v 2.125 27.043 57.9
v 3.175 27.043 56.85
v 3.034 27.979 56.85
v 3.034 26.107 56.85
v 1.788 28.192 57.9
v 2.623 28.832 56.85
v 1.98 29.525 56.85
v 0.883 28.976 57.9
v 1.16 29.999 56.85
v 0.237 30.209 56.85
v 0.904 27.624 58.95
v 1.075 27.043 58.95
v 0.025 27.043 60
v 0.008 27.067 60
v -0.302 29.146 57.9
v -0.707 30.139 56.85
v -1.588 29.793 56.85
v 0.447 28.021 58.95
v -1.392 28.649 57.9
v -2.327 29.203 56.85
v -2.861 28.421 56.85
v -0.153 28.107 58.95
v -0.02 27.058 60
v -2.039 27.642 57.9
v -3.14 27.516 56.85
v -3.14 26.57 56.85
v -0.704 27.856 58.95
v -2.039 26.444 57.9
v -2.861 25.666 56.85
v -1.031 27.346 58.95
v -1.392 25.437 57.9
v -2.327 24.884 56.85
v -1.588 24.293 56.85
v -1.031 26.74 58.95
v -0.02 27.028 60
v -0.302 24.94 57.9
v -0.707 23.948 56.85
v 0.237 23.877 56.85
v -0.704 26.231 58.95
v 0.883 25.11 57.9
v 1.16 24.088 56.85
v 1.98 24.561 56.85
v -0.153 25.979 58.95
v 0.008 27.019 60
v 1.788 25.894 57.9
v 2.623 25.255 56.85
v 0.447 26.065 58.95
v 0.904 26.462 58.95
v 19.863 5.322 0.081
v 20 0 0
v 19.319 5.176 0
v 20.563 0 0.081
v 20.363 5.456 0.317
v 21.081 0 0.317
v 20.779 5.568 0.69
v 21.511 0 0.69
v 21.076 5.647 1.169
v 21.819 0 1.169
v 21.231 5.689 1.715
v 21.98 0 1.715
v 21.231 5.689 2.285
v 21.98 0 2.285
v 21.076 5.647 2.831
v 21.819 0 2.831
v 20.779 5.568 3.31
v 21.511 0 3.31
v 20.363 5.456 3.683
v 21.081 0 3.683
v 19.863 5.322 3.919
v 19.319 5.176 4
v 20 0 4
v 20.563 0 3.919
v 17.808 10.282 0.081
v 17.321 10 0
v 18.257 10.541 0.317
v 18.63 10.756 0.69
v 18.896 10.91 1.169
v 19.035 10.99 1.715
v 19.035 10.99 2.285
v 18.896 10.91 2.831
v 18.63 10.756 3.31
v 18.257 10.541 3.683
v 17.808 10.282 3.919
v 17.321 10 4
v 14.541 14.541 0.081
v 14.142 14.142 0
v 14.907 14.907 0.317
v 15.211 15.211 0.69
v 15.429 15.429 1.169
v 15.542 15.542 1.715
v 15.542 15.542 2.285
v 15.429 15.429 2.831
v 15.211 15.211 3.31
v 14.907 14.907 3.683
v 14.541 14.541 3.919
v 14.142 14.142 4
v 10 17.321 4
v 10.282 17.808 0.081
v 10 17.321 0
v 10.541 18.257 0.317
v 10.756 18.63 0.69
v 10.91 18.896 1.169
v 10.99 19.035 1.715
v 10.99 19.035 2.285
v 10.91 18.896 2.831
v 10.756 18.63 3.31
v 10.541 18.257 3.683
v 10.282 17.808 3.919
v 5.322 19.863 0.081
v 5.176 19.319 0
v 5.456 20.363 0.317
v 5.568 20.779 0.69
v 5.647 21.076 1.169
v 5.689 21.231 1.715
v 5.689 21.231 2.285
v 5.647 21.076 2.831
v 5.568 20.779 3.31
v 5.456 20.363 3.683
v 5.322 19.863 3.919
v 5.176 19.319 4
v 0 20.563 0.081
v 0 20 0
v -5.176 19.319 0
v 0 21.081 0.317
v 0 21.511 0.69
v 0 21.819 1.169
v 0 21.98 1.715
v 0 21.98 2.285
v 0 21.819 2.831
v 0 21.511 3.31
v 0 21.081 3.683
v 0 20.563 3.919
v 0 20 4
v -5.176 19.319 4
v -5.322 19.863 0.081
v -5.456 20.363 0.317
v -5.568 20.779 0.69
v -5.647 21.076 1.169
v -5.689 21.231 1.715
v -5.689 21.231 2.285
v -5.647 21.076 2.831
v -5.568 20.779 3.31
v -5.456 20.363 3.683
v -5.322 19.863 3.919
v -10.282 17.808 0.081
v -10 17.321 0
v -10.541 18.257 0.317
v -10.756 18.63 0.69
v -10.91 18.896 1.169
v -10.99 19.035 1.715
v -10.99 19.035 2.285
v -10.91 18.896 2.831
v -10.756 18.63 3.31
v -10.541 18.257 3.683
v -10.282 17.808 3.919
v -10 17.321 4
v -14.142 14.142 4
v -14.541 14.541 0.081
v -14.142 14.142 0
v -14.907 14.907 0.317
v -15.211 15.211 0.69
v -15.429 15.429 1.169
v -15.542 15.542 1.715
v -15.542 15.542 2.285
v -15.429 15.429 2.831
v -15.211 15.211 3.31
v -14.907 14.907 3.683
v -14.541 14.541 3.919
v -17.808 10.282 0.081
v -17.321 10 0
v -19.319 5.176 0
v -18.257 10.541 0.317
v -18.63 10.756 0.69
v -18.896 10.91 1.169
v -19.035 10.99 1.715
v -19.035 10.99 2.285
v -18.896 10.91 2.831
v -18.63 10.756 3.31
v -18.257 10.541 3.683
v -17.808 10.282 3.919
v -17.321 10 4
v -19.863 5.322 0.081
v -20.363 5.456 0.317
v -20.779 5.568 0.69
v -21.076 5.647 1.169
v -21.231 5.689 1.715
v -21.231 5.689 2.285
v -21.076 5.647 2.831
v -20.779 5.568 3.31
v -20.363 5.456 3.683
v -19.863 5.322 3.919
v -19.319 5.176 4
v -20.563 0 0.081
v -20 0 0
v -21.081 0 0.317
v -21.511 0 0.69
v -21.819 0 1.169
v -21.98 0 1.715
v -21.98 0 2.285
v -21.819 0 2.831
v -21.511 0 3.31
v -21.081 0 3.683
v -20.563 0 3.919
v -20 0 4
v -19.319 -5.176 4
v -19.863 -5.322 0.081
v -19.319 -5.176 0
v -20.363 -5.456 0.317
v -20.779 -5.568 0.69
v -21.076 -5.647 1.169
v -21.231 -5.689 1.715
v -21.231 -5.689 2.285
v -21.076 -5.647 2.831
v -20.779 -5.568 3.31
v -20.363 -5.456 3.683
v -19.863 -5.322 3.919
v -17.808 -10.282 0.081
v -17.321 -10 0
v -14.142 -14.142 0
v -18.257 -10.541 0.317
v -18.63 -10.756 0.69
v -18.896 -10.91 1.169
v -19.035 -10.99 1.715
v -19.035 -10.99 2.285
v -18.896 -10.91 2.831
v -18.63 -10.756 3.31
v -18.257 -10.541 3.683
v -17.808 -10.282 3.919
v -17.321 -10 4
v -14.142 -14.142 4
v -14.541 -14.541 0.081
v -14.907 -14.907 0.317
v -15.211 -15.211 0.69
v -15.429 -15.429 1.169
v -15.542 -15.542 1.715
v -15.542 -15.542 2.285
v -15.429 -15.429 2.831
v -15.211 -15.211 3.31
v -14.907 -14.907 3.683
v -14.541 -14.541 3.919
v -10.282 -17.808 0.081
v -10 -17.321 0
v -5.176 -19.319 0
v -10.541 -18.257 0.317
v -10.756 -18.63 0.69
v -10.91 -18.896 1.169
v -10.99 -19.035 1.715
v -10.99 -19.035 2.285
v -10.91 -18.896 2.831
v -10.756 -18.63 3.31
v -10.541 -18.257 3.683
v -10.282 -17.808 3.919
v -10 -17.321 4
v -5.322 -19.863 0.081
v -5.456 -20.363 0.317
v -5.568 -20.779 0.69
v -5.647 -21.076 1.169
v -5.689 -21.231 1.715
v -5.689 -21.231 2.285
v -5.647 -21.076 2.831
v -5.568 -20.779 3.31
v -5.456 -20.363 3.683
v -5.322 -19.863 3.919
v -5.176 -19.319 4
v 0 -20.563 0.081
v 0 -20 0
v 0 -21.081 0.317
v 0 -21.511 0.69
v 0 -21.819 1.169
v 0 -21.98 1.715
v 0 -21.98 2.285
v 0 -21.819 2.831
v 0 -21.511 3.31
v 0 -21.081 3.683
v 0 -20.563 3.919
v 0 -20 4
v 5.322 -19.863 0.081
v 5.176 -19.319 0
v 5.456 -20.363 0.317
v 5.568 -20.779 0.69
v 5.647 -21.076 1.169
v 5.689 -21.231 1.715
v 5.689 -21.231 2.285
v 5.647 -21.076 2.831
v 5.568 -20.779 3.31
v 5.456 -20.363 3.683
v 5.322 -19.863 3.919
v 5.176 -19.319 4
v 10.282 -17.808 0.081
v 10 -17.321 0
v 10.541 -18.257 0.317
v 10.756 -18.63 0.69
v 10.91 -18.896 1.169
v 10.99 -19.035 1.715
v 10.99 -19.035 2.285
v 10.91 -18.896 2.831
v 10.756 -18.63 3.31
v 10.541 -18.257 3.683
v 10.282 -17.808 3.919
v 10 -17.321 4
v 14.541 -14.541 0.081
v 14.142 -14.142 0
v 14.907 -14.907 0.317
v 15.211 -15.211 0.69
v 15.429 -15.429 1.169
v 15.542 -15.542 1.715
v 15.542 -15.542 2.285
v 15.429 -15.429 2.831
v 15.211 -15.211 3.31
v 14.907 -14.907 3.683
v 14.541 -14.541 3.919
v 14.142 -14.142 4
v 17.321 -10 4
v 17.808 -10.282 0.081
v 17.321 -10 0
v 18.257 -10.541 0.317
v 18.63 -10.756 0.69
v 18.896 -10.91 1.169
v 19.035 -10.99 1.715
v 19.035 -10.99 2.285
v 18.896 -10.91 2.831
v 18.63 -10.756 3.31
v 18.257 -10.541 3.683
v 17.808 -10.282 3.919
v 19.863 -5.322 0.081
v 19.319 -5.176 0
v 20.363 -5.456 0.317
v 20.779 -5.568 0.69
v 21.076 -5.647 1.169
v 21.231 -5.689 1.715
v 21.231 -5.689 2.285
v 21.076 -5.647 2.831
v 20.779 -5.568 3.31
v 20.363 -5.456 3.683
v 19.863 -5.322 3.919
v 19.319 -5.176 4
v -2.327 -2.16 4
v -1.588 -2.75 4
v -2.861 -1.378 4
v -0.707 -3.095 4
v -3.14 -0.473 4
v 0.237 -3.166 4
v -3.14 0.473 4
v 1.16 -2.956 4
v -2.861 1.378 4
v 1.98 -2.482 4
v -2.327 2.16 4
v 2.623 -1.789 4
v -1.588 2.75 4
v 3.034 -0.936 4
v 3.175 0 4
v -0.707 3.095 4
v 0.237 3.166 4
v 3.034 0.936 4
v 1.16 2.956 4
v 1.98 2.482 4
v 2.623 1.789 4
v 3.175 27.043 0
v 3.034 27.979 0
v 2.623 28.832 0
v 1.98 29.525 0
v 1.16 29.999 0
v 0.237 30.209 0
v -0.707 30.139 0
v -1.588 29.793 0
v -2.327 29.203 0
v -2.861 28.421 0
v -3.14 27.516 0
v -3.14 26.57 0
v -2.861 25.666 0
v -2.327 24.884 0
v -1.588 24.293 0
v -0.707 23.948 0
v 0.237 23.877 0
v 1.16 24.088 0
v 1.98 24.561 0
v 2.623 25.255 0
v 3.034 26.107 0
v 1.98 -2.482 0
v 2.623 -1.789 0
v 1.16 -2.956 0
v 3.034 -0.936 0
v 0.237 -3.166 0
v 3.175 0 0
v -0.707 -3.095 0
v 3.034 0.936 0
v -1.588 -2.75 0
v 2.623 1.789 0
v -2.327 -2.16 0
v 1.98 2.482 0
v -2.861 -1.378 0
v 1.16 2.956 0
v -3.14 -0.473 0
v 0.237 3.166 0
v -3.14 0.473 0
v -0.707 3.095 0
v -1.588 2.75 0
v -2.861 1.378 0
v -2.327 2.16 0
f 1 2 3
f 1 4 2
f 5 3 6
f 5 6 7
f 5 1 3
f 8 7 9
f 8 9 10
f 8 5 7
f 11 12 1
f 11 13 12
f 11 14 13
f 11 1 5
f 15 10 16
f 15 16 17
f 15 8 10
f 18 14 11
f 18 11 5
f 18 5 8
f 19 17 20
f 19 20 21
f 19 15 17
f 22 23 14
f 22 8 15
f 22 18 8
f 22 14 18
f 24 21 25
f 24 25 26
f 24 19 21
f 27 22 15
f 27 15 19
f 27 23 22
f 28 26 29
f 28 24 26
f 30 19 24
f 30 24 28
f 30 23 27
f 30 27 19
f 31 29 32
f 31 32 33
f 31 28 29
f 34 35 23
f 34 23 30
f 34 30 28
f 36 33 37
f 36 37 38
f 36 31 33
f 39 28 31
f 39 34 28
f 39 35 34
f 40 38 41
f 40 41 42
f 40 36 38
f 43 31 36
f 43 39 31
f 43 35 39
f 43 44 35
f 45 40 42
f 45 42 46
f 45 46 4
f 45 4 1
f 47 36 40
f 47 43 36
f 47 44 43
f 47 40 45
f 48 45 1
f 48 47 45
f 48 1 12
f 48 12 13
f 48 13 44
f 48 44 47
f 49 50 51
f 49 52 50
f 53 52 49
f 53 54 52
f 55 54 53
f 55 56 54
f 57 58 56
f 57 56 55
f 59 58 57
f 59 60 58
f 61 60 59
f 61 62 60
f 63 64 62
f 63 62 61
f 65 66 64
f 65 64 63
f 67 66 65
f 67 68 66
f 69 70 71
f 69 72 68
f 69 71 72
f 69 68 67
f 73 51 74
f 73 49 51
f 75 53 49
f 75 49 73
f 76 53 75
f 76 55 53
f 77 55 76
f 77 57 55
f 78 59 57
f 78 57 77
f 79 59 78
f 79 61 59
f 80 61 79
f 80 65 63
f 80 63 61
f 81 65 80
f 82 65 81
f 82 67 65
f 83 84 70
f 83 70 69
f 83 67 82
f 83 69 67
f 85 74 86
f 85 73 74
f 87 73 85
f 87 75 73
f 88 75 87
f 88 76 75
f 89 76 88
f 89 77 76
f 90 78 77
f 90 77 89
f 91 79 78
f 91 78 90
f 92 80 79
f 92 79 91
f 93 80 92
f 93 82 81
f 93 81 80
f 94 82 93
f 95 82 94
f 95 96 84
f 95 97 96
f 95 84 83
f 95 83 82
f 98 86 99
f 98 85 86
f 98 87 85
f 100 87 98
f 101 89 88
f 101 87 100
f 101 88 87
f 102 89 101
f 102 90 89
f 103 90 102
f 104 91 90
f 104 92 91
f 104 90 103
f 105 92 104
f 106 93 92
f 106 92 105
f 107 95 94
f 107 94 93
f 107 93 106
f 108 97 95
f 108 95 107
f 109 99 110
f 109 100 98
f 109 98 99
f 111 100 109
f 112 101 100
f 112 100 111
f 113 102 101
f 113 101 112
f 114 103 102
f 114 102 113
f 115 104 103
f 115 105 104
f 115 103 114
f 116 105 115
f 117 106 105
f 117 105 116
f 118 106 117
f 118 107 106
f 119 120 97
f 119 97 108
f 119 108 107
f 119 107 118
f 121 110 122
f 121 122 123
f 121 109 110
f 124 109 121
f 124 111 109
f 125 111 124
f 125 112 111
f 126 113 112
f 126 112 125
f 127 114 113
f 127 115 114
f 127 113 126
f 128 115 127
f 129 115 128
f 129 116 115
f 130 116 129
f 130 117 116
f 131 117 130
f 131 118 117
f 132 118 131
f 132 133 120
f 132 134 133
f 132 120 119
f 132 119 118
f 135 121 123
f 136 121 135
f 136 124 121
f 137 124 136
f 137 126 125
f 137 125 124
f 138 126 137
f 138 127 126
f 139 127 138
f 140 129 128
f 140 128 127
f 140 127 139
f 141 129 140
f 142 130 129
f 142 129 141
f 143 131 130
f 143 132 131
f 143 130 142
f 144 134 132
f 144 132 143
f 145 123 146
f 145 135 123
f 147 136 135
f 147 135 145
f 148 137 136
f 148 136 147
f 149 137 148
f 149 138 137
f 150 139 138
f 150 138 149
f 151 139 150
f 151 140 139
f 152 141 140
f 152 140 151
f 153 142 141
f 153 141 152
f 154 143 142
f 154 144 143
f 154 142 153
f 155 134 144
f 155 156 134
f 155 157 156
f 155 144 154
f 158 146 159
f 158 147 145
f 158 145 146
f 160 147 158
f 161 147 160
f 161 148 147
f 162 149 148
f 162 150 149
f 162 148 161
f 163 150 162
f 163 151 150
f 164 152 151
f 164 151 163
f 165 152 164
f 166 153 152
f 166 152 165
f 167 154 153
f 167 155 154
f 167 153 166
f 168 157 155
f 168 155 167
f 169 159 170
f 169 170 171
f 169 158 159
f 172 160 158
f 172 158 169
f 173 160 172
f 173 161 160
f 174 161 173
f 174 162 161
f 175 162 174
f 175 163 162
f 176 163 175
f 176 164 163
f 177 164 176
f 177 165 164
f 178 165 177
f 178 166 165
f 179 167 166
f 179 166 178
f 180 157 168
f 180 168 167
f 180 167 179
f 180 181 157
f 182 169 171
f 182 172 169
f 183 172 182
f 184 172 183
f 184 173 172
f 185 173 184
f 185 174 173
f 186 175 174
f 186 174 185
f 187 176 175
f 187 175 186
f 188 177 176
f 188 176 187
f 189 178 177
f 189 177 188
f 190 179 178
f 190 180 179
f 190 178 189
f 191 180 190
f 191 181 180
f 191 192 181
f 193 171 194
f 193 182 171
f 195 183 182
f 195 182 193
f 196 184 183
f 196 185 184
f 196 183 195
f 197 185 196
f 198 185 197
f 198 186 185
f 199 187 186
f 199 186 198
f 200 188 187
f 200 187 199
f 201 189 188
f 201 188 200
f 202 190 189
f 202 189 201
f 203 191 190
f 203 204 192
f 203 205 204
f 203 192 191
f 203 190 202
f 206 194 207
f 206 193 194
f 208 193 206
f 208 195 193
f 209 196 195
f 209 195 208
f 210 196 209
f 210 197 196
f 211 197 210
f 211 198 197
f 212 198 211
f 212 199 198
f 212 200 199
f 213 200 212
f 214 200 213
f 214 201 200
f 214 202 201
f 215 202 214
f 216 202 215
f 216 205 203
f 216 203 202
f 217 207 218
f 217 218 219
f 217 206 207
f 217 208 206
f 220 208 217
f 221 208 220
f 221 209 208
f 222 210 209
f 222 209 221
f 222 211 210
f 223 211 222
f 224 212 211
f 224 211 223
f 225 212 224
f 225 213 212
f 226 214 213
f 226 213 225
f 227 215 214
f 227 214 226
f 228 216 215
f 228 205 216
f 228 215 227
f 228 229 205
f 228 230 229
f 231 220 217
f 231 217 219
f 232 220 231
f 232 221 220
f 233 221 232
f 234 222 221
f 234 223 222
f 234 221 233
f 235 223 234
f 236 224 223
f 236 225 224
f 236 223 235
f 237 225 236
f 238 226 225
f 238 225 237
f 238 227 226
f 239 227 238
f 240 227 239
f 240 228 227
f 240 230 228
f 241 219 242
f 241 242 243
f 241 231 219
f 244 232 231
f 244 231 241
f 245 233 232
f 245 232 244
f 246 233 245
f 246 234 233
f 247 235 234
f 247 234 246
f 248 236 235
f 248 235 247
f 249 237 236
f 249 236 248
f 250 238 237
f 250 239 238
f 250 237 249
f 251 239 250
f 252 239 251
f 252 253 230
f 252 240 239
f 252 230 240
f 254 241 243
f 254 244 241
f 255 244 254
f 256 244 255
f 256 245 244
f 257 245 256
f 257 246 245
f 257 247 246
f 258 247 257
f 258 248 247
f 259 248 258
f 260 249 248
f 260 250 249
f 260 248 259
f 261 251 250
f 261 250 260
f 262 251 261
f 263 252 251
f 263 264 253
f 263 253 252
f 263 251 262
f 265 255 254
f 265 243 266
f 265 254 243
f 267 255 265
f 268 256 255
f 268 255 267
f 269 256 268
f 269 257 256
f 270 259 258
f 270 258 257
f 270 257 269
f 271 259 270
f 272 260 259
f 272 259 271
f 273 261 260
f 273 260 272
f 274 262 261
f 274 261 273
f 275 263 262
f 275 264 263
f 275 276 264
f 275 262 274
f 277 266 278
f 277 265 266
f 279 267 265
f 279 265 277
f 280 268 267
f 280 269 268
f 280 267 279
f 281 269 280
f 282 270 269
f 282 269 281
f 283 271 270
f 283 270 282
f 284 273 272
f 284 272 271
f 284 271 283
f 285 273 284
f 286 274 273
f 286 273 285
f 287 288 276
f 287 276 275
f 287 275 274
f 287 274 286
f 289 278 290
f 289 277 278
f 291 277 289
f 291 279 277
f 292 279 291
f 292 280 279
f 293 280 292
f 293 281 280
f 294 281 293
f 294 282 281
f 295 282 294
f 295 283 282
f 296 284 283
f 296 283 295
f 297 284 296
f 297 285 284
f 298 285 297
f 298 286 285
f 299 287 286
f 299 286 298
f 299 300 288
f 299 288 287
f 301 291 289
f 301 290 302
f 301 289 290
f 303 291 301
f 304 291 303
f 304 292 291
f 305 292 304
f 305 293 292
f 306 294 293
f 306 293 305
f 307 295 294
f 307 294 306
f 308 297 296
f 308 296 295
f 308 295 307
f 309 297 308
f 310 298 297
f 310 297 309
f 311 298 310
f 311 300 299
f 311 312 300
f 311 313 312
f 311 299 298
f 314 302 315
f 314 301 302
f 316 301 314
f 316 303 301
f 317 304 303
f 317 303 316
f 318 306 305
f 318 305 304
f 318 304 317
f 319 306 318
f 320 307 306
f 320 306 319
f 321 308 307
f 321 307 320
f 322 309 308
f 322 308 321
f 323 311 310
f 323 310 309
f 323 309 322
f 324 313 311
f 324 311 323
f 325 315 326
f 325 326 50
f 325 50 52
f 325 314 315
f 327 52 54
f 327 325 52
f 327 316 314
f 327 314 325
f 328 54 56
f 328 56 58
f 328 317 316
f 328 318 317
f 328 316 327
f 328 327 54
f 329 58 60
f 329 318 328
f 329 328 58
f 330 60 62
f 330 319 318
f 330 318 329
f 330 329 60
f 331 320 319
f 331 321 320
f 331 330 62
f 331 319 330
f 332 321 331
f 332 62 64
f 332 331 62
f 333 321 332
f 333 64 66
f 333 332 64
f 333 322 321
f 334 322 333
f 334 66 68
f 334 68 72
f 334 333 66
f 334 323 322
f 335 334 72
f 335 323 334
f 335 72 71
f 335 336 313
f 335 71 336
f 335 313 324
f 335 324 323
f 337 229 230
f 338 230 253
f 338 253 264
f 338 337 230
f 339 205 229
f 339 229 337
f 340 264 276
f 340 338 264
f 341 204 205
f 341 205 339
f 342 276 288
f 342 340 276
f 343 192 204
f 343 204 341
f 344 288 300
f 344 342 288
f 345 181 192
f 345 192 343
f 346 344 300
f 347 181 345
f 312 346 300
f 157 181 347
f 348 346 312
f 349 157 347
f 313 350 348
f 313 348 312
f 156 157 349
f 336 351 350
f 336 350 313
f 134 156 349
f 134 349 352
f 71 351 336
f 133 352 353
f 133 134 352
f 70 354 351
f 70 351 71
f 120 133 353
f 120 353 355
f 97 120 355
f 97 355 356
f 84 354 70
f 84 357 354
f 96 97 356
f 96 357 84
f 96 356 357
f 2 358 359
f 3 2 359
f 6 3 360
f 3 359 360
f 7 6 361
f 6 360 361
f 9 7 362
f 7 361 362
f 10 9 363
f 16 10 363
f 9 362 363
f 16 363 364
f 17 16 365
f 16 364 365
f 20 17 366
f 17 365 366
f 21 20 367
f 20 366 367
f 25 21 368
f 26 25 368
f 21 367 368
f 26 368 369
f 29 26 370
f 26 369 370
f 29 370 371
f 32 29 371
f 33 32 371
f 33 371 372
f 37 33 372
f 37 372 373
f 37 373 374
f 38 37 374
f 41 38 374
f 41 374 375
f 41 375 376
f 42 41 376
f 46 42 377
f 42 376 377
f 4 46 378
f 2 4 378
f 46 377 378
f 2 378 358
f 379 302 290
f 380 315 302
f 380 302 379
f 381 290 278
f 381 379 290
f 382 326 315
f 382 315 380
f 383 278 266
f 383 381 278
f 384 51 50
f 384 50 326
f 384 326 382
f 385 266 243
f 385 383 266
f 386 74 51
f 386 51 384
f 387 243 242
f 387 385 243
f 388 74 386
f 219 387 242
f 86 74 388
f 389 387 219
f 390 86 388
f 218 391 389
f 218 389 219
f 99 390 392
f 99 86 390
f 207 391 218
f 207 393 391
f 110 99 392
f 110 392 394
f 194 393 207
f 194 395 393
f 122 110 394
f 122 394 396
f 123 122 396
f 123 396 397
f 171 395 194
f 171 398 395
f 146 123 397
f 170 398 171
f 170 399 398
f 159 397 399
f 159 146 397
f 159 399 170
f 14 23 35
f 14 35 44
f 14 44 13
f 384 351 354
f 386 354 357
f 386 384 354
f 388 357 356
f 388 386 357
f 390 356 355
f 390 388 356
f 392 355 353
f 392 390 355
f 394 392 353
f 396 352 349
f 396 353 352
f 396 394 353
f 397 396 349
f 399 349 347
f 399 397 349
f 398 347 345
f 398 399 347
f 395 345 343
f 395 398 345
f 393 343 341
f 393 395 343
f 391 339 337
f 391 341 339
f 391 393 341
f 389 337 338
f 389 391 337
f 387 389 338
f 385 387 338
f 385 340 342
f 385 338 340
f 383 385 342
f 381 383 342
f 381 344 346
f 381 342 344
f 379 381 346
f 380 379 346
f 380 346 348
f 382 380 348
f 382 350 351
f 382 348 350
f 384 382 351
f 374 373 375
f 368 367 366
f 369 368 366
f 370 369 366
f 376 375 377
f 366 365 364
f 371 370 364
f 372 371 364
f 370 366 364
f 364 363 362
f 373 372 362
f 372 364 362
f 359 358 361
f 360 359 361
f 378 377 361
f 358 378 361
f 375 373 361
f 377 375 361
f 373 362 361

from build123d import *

# Parameters (mm, degrees)
F1_R     = 3.175
F3_DEPTH = 6
F4_R     = 3.175
F5_DEPTH = 60
F6_SIZE  = 3.15


# Not quite as in the source:
# - a feature names something its author has since deleted; it is built from what else it names


with BuildPart() as f2:
    # F0 (on Front) → F2 (revolve)
    with BuildSketch(Plane.XZ):
        with BuildLine():
            Line((0, 4), (0, 0))
            Line((0, 0), (20, 0))
            ThreePointArc((20, 0), (22, 2), (20, 4))
            Line((20, 4), (0, 4))
        make_face()
    revolve(axis=Axis((0, 0, 2), (0, 0, 1)))

    # F1 (on Top) → F3 (cut)
    with BuildSketch(Plane.XY):
        Circle(F1_R)
    extrude(amount=F3_DEPTH, mode=Mode.SUBTRACT)


with BuildPart() as f5:
    # F4 (on Top) → F5 (new body)
    with BuildSketch(Plane.XY):
        with Locations((0, 27.0431211957)):
            Circle(F4_R)
    extrude(amount=F5_DEPTH)

    # F6
    f6_edges = [f5.edges().sort_by_distance(p)[0] for p in [
        (-3.175, 27.043121, 60),
    ]]
    chamfer(f6_edges, length=F6_SIZE)


solid = Compound([f2.part, f5.part])
